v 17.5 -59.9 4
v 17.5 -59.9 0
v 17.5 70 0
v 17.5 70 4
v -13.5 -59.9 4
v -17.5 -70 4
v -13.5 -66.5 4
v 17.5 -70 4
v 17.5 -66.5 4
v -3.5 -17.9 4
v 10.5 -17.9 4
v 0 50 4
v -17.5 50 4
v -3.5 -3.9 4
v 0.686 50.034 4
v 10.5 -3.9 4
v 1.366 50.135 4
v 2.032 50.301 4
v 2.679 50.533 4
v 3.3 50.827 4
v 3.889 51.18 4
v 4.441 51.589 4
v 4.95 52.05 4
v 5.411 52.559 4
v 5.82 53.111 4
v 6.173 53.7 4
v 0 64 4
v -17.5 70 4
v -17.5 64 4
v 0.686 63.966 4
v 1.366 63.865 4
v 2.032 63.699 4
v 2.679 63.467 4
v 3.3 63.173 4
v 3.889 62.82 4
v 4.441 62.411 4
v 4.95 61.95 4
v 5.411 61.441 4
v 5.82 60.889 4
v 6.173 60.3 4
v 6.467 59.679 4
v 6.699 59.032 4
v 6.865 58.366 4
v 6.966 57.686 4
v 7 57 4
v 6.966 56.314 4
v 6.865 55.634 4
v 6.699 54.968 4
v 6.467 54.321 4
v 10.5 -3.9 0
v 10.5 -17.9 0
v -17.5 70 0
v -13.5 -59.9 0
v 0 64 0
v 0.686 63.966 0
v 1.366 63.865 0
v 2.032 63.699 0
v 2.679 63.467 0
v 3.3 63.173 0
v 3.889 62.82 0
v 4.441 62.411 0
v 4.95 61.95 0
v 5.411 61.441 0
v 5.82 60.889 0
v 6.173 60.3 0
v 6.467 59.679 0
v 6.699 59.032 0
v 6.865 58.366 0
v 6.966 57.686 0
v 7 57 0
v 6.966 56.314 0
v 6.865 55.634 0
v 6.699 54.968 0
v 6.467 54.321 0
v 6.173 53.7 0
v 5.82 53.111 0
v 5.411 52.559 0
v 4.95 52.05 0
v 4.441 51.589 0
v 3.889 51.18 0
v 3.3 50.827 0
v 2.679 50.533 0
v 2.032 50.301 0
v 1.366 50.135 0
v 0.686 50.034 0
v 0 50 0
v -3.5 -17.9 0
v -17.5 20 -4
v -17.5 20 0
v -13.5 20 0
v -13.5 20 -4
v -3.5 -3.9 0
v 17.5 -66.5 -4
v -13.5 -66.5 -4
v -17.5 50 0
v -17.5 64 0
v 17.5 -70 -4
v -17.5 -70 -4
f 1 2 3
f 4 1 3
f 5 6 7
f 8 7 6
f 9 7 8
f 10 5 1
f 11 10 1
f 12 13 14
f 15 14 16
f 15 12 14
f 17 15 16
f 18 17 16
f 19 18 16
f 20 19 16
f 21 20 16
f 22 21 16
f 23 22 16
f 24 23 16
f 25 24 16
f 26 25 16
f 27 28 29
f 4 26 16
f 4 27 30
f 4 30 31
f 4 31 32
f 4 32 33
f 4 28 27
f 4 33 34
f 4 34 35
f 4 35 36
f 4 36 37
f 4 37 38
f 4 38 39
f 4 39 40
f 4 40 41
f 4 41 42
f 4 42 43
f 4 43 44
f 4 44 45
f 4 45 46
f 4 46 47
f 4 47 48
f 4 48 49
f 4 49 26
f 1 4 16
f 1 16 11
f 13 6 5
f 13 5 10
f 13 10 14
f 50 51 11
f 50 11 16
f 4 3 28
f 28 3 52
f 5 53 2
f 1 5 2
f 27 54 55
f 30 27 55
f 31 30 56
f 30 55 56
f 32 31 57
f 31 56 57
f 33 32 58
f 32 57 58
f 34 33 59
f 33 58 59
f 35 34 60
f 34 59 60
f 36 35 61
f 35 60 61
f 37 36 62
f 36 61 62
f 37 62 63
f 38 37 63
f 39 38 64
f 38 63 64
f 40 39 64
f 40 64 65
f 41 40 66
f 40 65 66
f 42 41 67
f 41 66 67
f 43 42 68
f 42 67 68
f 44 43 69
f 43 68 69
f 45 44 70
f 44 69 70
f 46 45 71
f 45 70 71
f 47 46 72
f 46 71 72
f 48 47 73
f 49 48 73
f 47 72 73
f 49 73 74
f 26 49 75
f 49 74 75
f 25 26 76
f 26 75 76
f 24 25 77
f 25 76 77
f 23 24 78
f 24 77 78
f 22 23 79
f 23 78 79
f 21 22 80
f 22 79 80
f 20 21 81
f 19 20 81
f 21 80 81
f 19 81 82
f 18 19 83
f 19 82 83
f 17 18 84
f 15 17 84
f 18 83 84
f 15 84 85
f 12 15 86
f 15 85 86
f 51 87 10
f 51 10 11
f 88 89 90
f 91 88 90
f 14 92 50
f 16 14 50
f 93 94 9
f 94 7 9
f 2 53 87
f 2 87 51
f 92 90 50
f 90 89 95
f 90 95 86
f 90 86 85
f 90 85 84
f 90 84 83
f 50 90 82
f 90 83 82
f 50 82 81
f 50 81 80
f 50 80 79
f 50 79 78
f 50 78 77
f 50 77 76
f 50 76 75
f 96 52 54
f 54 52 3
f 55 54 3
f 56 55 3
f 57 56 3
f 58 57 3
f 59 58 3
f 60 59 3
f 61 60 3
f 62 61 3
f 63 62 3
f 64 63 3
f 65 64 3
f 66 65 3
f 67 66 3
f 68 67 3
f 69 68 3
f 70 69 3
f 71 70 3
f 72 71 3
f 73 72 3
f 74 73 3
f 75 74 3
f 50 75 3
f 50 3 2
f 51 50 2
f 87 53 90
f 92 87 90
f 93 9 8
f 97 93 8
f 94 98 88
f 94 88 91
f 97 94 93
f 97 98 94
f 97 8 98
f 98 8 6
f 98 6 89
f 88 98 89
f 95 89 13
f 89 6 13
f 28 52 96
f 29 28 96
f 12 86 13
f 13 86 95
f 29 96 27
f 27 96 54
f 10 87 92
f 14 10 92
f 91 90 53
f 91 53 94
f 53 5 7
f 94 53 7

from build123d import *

# Parameters (mm, degrees)
F0_W     = 14
F0_H     = 14
F1_DEPTH = 4
F2_W     = 31
F2_H     = 3.5
F3_DEPTH = 4


with BuildPart() as f1:
    # F0 (on Top) → F1 (new body)
    with BuildSketch(Plane.XY):
        with BuildLine():
            Line((17.5, -59.9), (17.5, 70))
            Line((17.5, 70), (-17.5, 70))
            Line((-17.5, 70), (-17.5, 64))
            Line((-17.5, 64), (0, 64))
            ThreePointArc((0, 64), (7, 57), (0, 50))
            Line((0, 50), (-17.5, 50))
            Line((-17.5, 50), (-17.5, -70))
            Line((-17.5, -70), (17.5, -70))
            Line((17.5, -70), (17.5, -66.5))
            Line((17.5, -66.5), (-13.5, -66.5))
            Line((-13.5, -66.5), (-13.5, -59.9))
            Line((-13.5, -59.9), (17.5, -59.9))
        make_face()
        with Locations((3.5, -10.9)):
            Rectangle(F0_W, F0_H, mode=Mode.SUBTRACT)
    extrude(amount=F1_DEPTH)

    # F2 (on face) → F3 (join)
    with BuildSketch(Plane(origin=(0, 0, 0), x_dir=(1, 0, 0), z_dir=(0, 0, -1))):
        Polygon((-13.5, 70), (-17.5, 70), (-17.5, -20), (-13.5, -20), (-13.5, 66.5), align=None)
        with Locations((2, 68.25)):
            Rectangle(F2_W, F2_H)
    extrude(amount=F3_DEPTH)


solid = f1.part
